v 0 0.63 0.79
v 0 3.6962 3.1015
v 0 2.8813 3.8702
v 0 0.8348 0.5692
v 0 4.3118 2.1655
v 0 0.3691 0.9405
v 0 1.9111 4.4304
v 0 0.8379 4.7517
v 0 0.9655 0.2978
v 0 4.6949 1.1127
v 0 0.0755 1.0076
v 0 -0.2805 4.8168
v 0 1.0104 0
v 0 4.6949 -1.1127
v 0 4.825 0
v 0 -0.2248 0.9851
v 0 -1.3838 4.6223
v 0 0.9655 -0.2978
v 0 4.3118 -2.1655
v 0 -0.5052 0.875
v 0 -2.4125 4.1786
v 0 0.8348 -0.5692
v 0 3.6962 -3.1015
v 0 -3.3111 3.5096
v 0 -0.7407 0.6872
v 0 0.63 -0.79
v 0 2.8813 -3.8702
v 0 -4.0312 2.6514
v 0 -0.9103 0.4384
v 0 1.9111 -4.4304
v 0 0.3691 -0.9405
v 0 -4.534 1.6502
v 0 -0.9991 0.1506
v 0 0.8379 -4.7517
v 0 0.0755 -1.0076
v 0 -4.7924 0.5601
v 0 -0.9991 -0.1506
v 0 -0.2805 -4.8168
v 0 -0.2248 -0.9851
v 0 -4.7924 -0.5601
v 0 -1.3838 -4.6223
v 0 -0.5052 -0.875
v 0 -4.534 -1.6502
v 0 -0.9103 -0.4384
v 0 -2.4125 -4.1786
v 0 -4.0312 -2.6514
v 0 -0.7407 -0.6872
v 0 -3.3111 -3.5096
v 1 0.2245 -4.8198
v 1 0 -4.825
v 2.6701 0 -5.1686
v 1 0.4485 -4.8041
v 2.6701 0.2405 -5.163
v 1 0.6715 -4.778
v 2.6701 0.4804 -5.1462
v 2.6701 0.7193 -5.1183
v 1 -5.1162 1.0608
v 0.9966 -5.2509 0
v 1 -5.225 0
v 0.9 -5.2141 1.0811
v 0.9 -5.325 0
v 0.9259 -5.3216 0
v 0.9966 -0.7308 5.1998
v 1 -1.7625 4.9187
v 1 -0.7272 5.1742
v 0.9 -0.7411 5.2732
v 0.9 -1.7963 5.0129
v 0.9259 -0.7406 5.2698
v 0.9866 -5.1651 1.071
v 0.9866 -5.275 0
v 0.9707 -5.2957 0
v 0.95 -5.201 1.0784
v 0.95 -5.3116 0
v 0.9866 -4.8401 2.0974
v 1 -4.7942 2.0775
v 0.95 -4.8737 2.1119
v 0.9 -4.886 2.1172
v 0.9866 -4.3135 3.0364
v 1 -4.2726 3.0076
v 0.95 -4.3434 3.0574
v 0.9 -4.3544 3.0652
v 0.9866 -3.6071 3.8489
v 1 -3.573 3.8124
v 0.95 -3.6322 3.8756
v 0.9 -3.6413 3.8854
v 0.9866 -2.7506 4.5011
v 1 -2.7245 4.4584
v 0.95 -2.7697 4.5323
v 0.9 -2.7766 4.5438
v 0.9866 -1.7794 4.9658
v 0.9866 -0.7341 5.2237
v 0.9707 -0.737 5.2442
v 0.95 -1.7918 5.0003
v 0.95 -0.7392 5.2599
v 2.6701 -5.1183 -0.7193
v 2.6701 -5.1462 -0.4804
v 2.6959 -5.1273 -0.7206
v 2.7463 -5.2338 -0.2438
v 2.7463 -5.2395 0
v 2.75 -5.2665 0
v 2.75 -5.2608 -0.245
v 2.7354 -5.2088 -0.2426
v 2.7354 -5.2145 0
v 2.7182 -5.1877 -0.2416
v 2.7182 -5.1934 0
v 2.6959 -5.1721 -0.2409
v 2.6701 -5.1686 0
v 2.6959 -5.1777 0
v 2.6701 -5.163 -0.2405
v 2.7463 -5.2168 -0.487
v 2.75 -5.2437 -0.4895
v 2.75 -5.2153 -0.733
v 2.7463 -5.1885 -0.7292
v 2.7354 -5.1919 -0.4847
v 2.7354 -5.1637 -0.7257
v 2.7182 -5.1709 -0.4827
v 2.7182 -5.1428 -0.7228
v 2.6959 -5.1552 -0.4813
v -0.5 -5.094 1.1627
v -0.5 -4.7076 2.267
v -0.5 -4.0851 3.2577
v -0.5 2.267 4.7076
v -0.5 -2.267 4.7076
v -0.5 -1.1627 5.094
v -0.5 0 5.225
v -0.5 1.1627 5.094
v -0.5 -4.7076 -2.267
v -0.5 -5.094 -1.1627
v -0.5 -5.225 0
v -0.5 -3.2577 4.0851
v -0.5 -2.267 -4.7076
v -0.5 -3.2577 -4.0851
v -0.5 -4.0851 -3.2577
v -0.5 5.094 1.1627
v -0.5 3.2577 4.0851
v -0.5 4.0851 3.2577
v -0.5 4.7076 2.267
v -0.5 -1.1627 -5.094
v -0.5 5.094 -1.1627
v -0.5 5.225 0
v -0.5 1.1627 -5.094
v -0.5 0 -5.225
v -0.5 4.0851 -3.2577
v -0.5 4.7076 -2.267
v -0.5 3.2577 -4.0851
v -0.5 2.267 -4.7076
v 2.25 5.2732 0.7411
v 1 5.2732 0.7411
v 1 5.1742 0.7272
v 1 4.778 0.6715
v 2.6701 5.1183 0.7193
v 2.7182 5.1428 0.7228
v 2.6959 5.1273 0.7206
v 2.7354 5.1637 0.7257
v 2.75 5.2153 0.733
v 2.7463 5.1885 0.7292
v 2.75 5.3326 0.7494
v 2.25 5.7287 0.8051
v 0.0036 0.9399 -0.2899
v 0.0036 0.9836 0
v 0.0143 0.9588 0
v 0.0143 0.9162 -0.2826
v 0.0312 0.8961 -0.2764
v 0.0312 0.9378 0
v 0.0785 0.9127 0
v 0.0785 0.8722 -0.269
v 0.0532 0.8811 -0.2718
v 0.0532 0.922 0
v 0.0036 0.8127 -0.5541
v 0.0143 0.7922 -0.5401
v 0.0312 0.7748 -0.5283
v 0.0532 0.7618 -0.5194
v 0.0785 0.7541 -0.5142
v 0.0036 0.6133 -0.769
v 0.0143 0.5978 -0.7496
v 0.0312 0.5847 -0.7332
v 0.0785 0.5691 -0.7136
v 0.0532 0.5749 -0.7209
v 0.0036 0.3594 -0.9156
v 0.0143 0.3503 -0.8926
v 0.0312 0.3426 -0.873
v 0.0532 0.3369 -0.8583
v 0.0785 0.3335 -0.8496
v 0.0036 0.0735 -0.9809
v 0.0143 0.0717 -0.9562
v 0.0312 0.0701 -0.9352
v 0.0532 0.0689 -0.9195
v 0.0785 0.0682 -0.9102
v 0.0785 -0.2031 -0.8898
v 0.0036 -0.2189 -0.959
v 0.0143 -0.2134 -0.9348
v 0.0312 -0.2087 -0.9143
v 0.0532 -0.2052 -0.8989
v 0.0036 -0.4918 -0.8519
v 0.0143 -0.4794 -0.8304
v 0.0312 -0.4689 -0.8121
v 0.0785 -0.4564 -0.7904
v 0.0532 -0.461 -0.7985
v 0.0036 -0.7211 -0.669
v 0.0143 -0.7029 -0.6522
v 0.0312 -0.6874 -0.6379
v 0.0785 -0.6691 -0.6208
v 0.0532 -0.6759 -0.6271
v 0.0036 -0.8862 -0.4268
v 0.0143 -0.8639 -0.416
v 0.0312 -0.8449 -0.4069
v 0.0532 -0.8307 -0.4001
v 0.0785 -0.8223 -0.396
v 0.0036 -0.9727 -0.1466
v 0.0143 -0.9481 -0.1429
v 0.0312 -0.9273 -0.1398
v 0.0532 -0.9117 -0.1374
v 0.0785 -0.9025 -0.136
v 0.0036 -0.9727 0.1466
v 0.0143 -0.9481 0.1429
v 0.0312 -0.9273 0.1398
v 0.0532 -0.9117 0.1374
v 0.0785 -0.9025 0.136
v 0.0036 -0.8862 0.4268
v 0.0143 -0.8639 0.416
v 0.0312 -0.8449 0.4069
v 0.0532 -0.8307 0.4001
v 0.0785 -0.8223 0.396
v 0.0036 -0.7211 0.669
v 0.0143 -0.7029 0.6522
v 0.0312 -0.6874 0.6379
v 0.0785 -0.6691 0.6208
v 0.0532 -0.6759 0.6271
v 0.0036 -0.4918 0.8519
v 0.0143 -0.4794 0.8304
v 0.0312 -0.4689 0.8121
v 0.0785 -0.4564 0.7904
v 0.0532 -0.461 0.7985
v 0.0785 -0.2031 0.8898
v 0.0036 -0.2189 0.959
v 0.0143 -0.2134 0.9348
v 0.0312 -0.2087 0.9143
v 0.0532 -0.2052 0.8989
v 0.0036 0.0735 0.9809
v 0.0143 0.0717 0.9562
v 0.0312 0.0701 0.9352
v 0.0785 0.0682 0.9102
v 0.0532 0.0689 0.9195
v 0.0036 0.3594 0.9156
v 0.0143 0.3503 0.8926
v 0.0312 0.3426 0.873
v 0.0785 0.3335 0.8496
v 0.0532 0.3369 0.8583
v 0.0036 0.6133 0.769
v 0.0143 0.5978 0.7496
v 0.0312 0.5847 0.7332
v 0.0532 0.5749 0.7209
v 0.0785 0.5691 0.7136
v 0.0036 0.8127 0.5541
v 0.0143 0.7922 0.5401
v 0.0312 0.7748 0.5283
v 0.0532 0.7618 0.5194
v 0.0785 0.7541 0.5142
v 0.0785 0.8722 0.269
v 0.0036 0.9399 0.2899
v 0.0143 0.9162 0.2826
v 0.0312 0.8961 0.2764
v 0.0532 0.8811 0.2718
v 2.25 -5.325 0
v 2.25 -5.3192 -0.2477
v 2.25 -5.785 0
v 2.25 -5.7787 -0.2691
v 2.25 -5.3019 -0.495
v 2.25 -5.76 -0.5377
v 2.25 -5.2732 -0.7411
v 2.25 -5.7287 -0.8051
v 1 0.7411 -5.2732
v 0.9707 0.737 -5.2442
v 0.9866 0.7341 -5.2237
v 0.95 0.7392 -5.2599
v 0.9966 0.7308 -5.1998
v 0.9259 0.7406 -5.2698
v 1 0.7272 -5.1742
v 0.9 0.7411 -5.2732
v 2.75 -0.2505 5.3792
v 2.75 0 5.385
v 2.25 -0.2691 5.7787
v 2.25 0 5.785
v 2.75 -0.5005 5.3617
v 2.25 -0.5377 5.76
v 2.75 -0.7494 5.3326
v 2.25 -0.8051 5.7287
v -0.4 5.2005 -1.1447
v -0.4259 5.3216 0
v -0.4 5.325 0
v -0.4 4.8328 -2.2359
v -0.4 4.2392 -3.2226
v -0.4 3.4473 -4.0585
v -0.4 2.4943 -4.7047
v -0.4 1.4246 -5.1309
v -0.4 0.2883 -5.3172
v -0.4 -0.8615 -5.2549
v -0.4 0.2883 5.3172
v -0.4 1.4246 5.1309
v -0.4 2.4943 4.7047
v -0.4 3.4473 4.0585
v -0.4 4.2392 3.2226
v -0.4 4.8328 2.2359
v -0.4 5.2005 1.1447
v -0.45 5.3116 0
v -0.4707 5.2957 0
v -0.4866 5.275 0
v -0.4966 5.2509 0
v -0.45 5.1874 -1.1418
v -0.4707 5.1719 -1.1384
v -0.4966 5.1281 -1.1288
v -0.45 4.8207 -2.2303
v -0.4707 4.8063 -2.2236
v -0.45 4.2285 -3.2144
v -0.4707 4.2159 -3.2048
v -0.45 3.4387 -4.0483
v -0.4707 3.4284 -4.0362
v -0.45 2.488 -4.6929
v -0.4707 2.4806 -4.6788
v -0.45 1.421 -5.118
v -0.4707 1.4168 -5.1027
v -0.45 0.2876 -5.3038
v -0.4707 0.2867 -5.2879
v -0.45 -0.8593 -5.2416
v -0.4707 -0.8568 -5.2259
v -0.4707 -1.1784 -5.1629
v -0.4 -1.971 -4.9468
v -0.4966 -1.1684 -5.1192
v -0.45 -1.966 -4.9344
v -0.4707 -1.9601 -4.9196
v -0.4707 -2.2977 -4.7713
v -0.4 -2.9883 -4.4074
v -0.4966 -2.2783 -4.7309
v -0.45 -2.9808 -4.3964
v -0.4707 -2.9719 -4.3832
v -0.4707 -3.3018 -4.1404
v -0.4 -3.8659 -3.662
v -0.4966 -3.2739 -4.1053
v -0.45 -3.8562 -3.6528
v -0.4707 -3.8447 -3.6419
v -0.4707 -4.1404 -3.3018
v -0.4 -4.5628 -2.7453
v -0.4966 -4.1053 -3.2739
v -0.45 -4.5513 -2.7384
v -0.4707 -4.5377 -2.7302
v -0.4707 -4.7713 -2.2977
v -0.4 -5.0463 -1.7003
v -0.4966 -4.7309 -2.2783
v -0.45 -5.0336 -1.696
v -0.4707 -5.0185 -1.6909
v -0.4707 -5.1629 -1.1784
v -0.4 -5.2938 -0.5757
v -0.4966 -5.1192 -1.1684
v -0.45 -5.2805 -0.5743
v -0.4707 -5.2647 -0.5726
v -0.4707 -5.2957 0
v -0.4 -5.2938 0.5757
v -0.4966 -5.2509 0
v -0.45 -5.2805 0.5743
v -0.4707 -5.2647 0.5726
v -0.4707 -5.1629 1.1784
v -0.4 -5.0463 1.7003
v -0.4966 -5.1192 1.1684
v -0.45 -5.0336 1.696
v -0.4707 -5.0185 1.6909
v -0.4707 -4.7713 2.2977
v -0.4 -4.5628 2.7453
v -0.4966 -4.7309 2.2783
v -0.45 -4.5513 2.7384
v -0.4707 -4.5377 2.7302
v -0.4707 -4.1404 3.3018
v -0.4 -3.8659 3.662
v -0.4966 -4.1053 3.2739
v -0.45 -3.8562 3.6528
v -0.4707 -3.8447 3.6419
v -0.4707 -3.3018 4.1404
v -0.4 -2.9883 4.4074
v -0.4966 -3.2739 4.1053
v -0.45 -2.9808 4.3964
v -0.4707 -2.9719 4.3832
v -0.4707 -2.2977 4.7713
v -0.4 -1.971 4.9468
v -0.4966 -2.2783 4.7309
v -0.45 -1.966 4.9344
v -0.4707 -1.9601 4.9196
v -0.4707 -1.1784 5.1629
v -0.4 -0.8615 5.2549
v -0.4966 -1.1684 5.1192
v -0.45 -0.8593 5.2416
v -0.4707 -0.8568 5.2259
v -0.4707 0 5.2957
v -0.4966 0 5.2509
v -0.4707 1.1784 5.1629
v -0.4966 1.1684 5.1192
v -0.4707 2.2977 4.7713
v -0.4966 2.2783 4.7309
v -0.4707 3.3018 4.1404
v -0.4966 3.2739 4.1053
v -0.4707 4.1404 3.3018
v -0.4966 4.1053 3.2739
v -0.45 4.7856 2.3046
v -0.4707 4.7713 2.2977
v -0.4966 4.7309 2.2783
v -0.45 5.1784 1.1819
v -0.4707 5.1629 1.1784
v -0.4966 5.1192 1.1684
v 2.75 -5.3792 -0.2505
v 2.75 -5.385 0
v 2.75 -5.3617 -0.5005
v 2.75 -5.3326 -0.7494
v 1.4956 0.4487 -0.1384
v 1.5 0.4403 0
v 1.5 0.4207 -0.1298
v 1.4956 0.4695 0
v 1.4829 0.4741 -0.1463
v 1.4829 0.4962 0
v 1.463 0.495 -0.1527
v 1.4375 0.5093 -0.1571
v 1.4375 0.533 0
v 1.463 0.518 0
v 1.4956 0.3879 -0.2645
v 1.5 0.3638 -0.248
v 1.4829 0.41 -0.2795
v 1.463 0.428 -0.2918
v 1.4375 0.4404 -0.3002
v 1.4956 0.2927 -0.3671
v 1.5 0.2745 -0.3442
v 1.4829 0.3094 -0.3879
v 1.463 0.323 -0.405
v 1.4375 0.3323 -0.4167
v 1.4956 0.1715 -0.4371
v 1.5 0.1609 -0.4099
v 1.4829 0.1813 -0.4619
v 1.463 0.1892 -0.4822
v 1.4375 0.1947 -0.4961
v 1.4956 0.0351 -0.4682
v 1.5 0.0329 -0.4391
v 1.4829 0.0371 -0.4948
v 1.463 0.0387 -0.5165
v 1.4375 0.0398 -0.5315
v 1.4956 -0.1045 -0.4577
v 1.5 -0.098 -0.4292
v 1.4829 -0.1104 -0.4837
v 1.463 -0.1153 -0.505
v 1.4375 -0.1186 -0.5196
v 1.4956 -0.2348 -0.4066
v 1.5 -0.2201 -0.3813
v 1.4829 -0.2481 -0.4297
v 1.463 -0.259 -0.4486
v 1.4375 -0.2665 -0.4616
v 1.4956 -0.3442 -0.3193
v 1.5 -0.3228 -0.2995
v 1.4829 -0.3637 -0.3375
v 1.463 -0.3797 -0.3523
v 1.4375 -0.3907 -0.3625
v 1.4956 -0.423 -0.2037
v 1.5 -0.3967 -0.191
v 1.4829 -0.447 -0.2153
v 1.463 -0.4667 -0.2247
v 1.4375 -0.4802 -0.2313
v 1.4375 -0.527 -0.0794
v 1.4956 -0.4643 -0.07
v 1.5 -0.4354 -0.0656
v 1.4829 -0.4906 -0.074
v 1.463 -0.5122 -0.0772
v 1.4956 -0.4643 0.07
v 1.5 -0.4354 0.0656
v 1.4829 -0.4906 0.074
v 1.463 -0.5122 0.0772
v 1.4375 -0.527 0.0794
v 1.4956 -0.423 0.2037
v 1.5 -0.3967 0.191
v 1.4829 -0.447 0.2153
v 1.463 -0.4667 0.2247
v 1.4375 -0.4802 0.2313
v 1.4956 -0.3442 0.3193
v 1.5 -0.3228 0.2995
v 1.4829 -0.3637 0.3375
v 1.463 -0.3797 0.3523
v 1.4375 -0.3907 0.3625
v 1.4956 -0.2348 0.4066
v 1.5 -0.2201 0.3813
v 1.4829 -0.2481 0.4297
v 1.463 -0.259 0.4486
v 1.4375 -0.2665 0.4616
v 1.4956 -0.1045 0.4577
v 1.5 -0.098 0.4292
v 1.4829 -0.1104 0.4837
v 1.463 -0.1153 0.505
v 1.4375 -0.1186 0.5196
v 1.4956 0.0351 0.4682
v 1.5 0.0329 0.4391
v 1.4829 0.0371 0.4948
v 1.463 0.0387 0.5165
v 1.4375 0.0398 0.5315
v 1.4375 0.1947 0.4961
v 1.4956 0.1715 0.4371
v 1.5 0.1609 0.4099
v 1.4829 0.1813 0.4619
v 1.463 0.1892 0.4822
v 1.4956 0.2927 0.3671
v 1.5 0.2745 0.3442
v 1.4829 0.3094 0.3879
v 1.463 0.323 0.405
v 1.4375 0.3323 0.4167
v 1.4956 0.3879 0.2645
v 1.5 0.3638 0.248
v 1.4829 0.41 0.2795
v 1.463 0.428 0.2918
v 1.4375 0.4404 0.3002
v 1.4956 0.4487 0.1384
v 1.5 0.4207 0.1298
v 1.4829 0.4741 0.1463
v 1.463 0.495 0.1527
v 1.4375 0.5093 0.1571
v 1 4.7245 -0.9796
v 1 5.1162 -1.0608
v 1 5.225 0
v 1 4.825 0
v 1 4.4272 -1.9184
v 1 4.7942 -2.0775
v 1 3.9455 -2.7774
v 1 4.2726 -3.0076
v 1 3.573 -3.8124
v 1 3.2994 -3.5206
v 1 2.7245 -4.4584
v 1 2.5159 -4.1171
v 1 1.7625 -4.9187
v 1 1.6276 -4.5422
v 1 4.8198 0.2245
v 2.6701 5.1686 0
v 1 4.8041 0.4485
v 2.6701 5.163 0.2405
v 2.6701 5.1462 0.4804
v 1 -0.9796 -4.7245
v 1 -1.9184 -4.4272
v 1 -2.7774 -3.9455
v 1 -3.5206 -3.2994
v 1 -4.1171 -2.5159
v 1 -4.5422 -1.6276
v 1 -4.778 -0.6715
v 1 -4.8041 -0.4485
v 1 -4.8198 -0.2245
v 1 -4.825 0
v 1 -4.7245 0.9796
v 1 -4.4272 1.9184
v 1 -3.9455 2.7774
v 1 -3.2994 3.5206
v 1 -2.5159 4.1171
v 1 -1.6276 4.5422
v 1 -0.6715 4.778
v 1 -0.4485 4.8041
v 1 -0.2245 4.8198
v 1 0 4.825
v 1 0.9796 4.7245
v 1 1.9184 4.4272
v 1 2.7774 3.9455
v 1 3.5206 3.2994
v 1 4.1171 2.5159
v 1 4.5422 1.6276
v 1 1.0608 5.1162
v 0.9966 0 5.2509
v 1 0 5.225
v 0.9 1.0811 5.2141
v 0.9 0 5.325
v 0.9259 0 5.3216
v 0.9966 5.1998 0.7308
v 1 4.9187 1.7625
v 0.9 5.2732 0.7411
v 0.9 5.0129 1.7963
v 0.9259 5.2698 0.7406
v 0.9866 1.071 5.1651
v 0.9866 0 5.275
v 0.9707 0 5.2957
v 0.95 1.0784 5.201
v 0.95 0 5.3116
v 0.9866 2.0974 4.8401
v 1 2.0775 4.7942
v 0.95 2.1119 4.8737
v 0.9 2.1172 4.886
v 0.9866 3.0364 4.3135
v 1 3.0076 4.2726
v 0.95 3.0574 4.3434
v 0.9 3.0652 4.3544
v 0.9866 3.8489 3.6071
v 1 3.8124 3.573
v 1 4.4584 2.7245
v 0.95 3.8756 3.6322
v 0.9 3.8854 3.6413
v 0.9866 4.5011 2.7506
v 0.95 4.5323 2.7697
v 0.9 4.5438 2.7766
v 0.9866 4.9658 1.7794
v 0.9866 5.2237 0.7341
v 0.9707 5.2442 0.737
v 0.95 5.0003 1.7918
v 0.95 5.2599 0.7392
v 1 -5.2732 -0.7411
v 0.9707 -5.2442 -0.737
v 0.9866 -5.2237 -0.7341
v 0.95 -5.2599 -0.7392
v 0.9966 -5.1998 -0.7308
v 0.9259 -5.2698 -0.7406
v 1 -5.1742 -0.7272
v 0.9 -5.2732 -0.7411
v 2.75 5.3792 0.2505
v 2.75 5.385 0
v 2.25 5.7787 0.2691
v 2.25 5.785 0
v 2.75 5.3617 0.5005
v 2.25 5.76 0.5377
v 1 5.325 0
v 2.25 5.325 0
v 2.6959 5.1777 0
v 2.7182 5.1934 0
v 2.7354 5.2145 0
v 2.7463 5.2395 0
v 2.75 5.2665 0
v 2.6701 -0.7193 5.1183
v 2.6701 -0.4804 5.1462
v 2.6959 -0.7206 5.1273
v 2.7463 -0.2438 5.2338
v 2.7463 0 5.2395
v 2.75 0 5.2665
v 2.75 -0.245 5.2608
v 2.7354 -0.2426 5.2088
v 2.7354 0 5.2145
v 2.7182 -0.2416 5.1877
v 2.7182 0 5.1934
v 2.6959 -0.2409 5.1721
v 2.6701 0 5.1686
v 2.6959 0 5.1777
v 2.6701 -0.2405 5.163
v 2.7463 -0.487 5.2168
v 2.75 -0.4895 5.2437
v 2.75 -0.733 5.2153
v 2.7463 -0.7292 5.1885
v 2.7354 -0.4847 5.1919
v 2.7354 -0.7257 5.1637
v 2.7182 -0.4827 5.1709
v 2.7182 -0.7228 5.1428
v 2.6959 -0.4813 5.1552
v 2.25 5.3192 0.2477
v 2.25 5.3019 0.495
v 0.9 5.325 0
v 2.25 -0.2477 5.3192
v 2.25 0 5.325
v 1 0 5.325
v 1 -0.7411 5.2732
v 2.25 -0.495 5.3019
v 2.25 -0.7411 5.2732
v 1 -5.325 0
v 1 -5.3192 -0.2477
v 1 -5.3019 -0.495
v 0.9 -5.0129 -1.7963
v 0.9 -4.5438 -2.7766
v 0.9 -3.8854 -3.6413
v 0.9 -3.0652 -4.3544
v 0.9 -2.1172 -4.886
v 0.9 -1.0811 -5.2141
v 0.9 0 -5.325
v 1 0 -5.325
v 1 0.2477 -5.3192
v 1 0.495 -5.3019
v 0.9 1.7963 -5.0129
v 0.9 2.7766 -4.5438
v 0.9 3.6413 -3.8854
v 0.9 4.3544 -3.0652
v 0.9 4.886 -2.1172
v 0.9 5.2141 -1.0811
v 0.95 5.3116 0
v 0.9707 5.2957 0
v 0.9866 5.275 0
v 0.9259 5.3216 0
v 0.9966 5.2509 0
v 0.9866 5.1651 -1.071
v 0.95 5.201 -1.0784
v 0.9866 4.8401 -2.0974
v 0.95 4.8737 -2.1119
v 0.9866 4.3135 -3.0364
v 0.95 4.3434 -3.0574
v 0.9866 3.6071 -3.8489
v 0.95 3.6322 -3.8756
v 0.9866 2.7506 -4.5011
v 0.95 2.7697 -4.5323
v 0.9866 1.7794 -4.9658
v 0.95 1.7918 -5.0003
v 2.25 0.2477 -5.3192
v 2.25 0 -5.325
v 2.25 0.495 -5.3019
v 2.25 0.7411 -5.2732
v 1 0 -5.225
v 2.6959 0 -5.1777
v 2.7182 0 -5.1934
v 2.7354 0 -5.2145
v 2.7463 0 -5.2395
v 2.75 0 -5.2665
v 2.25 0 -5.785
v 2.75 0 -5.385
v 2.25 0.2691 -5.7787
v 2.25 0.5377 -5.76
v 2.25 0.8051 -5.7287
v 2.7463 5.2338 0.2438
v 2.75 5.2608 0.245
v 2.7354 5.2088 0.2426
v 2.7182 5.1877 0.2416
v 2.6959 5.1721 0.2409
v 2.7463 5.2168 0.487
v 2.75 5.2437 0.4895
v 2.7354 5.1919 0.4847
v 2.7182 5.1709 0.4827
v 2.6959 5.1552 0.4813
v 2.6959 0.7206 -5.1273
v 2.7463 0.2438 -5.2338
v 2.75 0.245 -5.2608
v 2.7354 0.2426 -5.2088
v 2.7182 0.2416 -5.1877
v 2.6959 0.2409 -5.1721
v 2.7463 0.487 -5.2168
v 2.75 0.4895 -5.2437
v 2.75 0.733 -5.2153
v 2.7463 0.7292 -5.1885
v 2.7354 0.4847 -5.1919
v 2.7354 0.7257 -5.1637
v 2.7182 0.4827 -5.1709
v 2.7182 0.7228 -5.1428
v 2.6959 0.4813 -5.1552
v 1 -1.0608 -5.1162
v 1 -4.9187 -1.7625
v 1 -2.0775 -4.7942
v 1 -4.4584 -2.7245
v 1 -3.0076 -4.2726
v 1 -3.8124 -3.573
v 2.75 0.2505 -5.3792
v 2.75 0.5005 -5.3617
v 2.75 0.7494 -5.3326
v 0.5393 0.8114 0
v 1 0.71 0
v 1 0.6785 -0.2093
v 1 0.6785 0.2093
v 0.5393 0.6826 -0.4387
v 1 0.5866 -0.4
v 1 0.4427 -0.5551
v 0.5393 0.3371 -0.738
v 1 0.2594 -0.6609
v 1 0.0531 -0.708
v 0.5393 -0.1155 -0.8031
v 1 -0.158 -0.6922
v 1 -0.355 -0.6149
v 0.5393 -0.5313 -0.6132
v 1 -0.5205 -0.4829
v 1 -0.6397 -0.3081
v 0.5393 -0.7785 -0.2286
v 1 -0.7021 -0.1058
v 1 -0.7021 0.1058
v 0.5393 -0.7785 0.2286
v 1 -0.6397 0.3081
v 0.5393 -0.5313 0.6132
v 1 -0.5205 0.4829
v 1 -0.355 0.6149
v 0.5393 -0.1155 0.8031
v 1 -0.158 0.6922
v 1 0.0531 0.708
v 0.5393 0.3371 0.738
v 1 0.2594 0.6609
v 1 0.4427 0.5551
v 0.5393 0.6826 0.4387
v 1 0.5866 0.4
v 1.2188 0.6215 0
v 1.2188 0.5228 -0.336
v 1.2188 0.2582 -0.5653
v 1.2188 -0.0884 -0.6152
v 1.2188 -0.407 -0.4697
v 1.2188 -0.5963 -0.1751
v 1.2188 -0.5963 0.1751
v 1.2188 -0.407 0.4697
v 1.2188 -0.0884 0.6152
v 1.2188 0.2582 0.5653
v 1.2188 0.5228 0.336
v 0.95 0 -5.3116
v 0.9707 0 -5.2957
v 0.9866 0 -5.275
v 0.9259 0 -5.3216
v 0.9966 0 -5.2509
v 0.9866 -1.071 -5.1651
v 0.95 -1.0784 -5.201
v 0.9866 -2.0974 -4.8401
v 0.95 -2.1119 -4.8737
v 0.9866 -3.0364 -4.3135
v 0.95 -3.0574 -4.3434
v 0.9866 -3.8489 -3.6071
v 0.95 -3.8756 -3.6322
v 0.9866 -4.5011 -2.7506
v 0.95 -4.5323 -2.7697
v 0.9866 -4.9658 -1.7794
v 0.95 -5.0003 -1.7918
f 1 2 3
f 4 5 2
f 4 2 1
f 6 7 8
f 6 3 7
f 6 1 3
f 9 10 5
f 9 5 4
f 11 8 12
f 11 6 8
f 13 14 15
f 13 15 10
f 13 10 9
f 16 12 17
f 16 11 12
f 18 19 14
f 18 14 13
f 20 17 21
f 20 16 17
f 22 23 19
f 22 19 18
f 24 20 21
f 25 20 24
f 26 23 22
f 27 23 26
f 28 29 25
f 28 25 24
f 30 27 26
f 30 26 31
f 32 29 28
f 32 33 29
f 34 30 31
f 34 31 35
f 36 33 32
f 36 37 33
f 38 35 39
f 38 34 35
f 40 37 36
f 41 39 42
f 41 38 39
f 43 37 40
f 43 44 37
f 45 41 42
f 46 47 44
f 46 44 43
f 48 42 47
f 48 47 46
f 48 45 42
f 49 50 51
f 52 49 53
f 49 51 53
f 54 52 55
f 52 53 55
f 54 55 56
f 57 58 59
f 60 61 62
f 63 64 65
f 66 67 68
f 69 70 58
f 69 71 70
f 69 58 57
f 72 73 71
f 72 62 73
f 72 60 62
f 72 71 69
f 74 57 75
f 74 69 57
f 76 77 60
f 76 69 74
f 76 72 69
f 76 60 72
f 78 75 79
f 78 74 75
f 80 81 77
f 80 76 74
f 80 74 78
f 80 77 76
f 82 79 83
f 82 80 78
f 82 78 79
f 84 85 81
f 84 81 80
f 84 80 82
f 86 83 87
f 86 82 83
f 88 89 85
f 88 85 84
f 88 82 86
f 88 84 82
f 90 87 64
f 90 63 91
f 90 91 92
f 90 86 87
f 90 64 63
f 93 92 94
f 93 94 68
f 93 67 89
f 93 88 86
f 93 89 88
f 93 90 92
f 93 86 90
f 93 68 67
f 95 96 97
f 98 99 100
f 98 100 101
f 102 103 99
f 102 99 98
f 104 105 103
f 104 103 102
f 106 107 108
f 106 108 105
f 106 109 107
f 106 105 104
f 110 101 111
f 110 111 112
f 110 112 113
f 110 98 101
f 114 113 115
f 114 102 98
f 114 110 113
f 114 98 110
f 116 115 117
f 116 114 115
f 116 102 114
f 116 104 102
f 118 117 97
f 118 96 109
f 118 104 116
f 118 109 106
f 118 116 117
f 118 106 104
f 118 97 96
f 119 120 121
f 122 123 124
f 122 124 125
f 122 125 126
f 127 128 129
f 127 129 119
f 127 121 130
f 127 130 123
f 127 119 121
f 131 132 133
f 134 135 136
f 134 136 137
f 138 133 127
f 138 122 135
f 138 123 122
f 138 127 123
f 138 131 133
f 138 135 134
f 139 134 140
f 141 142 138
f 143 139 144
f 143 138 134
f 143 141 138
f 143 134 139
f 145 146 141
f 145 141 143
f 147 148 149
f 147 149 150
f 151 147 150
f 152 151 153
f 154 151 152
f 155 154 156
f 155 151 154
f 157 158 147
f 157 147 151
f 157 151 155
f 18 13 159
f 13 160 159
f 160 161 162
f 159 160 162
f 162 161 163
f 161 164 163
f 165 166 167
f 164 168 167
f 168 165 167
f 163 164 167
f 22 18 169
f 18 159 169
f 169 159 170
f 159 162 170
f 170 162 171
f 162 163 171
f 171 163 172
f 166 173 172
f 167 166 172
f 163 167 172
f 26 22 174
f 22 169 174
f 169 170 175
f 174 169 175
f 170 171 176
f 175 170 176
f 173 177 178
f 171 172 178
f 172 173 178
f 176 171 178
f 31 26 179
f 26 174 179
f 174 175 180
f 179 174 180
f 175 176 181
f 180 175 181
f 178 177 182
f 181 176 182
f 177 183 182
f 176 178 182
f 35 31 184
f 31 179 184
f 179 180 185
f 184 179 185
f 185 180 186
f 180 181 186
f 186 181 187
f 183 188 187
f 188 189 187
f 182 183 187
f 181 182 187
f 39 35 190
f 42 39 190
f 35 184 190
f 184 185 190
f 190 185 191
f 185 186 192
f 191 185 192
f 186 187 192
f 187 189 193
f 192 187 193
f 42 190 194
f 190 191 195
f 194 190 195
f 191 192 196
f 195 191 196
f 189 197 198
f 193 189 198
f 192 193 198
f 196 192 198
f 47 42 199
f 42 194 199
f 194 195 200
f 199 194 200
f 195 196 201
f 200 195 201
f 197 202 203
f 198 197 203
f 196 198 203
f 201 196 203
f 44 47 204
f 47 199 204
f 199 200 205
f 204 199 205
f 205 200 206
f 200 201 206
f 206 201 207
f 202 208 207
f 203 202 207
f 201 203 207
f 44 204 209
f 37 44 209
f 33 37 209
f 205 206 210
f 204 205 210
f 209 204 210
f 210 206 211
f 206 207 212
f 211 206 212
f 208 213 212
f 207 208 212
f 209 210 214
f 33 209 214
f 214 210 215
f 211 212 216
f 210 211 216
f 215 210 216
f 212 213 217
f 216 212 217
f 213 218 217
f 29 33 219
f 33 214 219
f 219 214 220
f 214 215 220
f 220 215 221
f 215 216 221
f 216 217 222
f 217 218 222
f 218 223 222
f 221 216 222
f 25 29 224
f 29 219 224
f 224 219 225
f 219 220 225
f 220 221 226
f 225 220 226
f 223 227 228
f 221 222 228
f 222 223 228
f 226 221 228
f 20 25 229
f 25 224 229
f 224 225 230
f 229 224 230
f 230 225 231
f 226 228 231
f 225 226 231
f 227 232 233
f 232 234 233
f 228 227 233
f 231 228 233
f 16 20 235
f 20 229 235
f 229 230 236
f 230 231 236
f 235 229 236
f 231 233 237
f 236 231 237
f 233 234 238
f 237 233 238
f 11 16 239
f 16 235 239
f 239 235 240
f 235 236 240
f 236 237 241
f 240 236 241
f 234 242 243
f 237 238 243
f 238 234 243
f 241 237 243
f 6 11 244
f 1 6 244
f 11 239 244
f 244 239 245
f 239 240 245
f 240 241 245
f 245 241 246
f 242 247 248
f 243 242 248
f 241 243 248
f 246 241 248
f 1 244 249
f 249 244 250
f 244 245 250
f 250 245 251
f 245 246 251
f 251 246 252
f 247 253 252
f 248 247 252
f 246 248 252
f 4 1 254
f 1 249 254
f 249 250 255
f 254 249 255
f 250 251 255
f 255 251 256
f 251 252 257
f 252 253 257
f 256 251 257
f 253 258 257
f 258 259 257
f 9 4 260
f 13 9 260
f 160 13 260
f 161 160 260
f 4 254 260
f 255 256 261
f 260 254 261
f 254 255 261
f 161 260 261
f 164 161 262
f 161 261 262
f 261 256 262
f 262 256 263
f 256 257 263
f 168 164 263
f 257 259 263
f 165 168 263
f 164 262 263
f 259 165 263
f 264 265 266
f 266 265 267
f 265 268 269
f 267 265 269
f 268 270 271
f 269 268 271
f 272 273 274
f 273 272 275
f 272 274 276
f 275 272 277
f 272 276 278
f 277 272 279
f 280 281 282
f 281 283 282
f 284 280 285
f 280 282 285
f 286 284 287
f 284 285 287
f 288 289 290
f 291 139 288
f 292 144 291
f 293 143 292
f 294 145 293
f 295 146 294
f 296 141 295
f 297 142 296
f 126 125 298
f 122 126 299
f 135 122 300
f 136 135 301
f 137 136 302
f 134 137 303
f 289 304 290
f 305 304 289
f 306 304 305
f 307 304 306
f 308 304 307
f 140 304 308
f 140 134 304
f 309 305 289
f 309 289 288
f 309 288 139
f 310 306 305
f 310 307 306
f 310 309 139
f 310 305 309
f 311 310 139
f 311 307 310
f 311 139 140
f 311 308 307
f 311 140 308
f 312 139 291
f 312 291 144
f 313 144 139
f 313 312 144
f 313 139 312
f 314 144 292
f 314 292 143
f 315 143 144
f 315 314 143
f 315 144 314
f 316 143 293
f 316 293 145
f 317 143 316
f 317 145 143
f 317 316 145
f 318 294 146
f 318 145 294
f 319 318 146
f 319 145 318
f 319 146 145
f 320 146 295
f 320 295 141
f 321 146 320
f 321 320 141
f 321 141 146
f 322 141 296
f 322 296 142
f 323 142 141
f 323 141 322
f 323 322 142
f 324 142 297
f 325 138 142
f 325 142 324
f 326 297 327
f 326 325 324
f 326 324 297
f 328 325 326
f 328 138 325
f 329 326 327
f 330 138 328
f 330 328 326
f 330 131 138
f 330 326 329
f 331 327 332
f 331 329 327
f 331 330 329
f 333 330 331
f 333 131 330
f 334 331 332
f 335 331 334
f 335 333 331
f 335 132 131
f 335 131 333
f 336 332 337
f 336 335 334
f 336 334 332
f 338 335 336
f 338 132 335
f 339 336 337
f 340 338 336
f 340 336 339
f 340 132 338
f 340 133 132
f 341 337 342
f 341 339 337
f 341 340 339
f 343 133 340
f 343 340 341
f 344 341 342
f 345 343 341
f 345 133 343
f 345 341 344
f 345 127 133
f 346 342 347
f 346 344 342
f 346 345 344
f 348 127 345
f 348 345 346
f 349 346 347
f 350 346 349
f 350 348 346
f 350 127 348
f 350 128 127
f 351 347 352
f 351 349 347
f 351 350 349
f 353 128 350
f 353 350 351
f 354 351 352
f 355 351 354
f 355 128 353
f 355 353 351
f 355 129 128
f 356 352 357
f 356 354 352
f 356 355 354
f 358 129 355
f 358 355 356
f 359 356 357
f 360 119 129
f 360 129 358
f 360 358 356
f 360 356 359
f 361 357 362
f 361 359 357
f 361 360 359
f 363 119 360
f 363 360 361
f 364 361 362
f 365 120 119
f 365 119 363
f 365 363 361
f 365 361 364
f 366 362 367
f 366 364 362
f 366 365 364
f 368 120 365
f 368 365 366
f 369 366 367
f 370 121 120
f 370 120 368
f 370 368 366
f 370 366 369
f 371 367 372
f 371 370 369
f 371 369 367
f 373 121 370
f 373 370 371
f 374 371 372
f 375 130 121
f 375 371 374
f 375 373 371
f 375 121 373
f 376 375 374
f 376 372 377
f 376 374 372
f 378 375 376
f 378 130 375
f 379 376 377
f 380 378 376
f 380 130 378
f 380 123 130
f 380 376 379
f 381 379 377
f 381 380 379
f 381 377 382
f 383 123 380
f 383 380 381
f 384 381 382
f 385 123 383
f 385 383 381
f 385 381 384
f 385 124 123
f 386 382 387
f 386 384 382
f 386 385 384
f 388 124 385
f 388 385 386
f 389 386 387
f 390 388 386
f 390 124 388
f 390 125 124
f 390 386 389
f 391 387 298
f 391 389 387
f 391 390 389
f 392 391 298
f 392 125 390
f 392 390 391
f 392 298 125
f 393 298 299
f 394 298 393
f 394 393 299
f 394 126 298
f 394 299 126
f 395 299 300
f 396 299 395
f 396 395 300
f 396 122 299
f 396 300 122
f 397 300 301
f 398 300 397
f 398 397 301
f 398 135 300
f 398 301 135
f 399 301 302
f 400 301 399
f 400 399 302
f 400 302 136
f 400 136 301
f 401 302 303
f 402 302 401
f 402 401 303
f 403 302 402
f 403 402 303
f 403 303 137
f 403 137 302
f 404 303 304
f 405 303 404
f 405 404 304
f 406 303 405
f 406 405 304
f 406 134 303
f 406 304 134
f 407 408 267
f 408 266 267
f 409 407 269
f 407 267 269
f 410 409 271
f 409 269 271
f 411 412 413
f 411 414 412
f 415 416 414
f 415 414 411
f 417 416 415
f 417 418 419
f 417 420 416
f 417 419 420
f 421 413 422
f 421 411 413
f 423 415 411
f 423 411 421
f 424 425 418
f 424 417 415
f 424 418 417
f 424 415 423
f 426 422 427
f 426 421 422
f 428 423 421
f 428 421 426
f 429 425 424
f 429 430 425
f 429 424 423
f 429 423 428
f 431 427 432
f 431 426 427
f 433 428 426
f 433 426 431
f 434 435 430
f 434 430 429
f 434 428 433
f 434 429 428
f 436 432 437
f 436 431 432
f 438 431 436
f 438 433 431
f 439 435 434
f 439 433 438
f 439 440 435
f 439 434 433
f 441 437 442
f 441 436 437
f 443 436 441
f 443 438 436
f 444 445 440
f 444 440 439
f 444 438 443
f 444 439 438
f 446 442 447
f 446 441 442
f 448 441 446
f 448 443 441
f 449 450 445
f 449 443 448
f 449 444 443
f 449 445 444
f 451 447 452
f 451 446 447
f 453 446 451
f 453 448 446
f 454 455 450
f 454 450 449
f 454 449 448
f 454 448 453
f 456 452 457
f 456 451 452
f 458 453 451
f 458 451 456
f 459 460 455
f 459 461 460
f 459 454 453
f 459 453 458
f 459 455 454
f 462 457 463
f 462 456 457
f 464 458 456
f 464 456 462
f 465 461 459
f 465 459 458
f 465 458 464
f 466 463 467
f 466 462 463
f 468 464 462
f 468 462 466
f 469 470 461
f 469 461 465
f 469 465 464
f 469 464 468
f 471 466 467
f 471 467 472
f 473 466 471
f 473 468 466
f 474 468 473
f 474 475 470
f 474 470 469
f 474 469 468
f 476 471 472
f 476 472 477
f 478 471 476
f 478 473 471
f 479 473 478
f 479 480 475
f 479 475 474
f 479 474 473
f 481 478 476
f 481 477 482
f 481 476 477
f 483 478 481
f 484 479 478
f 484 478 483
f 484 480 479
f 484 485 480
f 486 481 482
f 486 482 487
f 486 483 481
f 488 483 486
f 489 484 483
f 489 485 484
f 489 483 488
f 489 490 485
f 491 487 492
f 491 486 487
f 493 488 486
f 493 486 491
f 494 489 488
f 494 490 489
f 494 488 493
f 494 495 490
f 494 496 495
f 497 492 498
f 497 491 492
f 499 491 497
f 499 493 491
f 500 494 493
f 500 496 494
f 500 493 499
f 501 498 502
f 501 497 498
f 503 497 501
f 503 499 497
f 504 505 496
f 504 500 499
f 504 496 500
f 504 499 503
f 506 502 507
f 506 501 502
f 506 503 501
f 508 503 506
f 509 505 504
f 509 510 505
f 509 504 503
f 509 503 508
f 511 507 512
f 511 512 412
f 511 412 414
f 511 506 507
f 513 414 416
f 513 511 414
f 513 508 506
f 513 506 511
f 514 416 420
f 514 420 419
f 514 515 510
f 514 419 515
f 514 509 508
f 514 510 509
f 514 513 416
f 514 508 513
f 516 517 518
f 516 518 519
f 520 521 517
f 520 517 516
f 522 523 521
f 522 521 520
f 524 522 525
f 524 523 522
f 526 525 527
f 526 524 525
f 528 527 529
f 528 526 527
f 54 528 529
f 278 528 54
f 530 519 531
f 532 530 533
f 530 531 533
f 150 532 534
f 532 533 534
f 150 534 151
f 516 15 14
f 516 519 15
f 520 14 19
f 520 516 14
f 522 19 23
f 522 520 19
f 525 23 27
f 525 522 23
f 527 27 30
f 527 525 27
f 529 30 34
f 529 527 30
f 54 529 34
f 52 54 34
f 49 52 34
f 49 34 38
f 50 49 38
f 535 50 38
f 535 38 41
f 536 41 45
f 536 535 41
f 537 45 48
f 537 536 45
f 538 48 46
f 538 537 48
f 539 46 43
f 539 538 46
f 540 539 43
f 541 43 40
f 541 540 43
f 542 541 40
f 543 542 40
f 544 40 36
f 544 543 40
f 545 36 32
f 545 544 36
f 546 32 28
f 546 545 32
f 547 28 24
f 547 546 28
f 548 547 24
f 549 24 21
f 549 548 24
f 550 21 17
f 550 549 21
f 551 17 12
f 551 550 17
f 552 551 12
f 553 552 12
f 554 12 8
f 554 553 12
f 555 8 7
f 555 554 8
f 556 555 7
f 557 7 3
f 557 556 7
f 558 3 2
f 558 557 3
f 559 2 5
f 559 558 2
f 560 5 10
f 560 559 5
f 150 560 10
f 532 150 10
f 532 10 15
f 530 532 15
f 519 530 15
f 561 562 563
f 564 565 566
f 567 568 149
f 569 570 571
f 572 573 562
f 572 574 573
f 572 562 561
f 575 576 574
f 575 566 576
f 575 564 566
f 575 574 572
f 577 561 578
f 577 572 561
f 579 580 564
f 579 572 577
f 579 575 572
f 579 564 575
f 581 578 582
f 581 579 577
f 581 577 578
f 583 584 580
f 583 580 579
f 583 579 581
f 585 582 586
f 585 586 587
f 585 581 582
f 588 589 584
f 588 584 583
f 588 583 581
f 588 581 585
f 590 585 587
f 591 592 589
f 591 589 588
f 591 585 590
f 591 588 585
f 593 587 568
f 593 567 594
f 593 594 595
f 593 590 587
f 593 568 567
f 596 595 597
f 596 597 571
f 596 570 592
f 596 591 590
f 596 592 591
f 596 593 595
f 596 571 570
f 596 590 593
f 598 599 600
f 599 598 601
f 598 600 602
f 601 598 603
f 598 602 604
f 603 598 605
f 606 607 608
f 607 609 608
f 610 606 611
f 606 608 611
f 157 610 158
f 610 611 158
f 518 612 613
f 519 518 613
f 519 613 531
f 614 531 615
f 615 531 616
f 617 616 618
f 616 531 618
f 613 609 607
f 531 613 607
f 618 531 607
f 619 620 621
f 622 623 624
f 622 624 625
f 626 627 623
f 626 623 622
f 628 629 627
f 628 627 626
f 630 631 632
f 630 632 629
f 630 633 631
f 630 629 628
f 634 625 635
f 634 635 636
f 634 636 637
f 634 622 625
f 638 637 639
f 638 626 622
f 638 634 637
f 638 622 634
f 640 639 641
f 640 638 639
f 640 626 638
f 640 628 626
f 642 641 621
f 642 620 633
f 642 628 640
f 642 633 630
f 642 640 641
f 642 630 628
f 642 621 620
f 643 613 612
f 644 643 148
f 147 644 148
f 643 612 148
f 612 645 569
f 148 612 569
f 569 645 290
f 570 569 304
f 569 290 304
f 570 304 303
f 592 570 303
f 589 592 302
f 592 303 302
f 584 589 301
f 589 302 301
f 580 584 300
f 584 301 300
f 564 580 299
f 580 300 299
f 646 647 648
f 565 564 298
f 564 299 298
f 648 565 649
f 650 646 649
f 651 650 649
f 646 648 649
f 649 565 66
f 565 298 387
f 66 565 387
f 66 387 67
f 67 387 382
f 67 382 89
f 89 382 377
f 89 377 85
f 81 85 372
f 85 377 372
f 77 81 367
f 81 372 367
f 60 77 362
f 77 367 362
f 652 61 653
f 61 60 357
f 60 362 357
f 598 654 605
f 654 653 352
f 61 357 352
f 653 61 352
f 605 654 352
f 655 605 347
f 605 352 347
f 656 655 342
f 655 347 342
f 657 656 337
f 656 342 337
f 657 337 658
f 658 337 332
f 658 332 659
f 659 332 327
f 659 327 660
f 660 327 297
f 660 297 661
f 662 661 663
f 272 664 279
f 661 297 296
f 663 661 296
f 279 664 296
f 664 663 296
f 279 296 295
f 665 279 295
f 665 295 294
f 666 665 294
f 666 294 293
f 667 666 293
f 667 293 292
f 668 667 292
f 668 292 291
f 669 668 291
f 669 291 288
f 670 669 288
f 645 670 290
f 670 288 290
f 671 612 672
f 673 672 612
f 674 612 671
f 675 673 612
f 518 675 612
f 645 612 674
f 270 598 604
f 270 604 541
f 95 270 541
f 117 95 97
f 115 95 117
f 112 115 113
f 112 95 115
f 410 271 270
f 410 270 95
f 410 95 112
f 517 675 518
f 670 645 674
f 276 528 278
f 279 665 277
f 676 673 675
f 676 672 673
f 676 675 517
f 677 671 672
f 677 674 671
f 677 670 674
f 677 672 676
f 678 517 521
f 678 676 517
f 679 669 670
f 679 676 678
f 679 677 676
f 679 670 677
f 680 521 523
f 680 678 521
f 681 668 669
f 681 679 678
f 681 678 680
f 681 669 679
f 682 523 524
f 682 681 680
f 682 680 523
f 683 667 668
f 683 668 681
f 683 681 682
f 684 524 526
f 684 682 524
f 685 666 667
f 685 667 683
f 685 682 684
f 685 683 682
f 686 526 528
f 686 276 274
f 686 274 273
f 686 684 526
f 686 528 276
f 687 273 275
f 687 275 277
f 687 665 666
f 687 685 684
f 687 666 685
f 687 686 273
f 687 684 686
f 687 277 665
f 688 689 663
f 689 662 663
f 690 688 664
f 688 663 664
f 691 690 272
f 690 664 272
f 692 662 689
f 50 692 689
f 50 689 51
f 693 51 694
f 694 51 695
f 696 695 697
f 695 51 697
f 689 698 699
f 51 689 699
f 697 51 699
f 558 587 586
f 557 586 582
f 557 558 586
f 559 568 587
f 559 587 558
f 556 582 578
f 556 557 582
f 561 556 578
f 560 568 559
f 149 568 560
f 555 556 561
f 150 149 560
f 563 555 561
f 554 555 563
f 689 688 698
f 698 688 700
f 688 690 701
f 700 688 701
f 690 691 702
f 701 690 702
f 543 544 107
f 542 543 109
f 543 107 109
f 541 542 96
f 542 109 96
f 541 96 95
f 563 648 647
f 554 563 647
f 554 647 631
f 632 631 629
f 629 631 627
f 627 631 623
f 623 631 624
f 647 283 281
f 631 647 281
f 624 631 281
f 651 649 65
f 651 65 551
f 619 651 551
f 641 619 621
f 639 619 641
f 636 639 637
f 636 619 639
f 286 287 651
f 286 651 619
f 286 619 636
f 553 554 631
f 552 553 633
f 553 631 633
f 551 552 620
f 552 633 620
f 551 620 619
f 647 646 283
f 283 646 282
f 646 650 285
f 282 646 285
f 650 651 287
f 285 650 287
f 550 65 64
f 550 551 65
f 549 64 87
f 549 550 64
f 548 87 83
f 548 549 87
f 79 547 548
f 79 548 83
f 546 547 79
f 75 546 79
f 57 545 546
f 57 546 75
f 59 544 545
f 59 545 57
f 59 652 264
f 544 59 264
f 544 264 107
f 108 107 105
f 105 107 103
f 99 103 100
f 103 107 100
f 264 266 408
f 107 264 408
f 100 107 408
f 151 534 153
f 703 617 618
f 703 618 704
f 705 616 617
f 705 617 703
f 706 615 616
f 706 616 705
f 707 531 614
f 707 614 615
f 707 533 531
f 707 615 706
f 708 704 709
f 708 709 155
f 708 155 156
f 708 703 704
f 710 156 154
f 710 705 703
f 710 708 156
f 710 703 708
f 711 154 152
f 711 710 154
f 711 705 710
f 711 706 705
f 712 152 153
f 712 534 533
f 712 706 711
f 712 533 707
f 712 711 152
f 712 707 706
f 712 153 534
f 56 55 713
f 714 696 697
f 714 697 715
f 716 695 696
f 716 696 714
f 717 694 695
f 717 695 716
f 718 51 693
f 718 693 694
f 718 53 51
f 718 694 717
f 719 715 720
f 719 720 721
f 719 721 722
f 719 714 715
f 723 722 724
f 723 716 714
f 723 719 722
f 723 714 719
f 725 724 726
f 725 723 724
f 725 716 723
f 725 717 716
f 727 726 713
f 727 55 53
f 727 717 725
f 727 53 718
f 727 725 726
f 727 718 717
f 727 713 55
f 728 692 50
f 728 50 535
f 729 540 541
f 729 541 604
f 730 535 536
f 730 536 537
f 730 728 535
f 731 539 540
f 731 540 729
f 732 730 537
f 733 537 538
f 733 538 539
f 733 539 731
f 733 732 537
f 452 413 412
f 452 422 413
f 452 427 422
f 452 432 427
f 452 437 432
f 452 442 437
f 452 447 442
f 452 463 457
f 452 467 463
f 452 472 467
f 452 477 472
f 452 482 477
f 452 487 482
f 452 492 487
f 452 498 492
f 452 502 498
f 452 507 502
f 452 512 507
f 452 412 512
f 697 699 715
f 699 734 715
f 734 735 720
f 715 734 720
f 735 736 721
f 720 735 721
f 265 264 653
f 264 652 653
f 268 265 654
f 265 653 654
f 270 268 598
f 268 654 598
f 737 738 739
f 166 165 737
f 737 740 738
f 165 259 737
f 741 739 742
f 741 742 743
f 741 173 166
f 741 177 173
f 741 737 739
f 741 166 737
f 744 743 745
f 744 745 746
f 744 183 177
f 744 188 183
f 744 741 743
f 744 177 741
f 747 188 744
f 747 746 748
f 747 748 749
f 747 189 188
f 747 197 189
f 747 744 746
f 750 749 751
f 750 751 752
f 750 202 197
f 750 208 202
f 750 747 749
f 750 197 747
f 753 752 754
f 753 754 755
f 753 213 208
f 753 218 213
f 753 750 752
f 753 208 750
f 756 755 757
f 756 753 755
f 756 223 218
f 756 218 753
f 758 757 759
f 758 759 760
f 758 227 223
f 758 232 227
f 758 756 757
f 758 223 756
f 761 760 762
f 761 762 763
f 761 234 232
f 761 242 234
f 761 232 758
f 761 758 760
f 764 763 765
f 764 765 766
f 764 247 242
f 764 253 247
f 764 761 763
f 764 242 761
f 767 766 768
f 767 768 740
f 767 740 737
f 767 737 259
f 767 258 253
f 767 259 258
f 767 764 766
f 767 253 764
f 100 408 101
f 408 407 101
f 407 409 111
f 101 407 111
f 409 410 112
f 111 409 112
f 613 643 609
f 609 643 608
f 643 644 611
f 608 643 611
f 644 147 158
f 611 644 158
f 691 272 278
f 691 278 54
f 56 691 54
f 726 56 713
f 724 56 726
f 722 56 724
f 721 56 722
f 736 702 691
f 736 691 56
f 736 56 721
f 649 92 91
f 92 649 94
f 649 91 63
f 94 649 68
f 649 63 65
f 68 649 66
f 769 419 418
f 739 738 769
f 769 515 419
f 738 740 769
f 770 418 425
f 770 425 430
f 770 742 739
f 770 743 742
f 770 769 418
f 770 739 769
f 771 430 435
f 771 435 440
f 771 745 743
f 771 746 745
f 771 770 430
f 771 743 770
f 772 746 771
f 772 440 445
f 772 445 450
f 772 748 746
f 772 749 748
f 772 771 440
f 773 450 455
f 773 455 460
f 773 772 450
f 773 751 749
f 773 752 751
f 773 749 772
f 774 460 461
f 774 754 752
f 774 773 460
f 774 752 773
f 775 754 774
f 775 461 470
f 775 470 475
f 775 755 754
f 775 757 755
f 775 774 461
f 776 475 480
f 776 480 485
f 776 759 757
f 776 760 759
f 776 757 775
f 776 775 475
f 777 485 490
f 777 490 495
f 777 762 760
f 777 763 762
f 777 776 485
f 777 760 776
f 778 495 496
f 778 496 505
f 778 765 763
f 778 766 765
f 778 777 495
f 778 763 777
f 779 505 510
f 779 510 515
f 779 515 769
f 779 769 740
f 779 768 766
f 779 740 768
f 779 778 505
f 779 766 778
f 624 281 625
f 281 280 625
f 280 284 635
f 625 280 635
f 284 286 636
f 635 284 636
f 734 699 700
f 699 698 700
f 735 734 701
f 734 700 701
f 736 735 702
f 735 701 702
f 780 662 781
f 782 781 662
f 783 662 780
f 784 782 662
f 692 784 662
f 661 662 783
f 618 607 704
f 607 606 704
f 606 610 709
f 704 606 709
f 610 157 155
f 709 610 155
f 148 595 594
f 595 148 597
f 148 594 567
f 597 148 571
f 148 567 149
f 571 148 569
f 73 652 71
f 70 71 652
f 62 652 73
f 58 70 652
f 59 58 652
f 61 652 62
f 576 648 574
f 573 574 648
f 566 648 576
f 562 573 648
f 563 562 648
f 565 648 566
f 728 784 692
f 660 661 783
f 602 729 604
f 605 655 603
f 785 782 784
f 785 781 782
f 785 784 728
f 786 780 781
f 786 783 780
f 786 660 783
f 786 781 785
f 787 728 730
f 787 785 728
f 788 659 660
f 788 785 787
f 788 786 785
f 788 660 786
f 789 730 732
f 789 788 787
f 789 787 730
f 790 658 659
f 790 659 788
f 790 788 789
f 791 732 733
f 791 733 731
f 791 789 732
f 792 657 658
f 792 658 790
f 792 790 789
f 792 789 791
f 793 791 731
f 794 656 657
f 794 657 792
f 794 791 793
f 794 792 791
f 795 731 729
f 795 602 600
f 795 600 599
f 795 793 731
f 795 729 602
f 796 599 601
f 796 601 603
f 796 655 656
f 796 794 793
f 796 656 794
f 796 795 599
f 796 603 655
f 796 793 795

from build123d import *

# Parameters (mm, degrees)
REVOLVE6_ANGLE    = 8
CIRPATTERN2_COUNT = 4
FILLET2_R         = 0.1


with BuildPart() as part:
    # Sketch1 → Revolve2 (revolve)
    with BuildSketch(Plane.XY):
        Polygon((1, 5.325), (0, 5.325), (-0.5, 5.325), (-0.5, 4.885), (-0.5, 1.49), (-0.5, 0), (0.25, 0), (1, 0), (1.5, 0), (1.5, 0.507702176), (1, 0.71), (0, 0.93), (0, 4.825), (1, 4.825), align=None)
    revolve(axis=Axis((1, 0, 0), (-1, 0, 0)))

    # Sketch4 → Revolve6 (revolve)
    with BuildSketch(Plane.XY):
        Polygon((2.75, 5.185), (2.75, 5.385), (2.25, 5.785), (2.25, 5.325), (1, 5.325), (1, 5.185), (1, 4.825), align=None)
    revolve6 = revolve(axis=Axis((0, 0, 0), (1, 0, 0)), revolution_arc=REVOLVE6_ANGLE)

    # CirPattern2: Revolve6 ×4 about axis
    cirpattern2_axis = Axis((0, 0, 0), (-1, 0, 0))
    for i in range(1, CIRPATTERN2_COUNT):
        add(revolve6.rotate(cirpattern2_axis, i * 360 / CIRPATTERN2_COUNT))

    # Fillet2
    # the kernel refuses this fillet: 0.1 mm, written as the material it adds along each edge
    with BuildSketch(Plane(origin=(0, 0, 0), x_dir=(0, 1, 0), z_dir=(0, 0, 1))) as fillet2_piece_1:
        with BuildLine():
            CenterArc((0.93 + FILLET2_R * 0.803914058894, -FILLET2_R), FILLET2_R, 90, 77.592581473)
            Line((0.93 - FILLET2_R * 0.172730407811, -FILLET2_R * 0.785138217325), (0.93, 0))
            Line((0.93, 0), (0.93 + FILLET2_R * 0.803914058894, 0))
        make_face()
    revolve(axis=Axis((0, 0, 0), (-1, 0, 0)))
    # the kernel refuses this fillet: 0.1 mm, written as the material it takes off along each edge
    with BuildSketch(Plane(origin=(1.5, 0, 0), x_dir=(0, 1, 0), z_dir=(0, 0, 1))) as fillet2_2_piece_1:
        with BuildLine():
            CenterArc((0.507702176 - FILLET2_R * 0.674152532906, FILLET2_R), FILLET2_R, 270, 67.971958378)
            Line((0.507702176 - FILLET2_R * 0.674152532906, 0), (0.507702176, 0))
            Line((0.507702176, 0), (0.507702176 + FILLET2_R * 0.252847871179, FILLET2_R * 0.62493967042))
        make_face()
    revolve(axis=Axis((1.5, 0, 0), (-1, 0, 0)), mode=Mode.SUBTRACT)
    with BuildSketch(Plane(origin=(1, 0, 0), x_dir=(0, 1, 0), z_dir=(0, 0, 1))) as fillet2_2_piece_2:
        with BuildLine():
            CenterArc((5.325 - FILLET2_R, FILLET2_R), FILLET2_R, 270, 90)
            Line((5.325, FILLET2_R), (5.325, 0))
            Line((5.325, 0), (5.325 - FILLET2_R, 0))
        make_face()
    revolve(axis=Axis((1, 0, 0), (-1, 0, 0)), revolution_arc=82, mode=Mode.SUBTRACT)
    with BuildSketch(Plane(origin=(2.75, 0, 0), x_dir=(0, -0.03929693023506649, -0.9992275773186509), z_dir=(0, -0.9992275773186509, 0.03929693023506649))) as fillet2_2_piece_3:
        with BuildLine():
            CenterArc((5.185 + FILLET2_R * 0.815225657351, -FILLET2_R), FILLET2_R, 90, 78.375604276)
            Line((5.185 + FILLET2_R * 0.815225657351, 0), (5.185, 0))
            Line((5.185, 0), (5.185 - FILLET2_R * 0.164263887349, -FILLET2_R * 0.798505007947))
        make_face()
    revolve(axis=Axis((2.75, 0, 0), (1, 0, 0)), revolution_arc=12.50425629, mode=Mode.SUBTRACT)
    with BuildSketch(Plane(origin=(1, 0, 0), x_dir=(0, 0, -1), z_dir=(0, 1, 0))) as fillet2_2_piece_4:
        with BuildLine():
            CenterArc((5.325 - FILLET2_R, FILLET2_R), FILLET2_R, 270, 90)
            Line((5.325, FILLET2_R), (5.325, 0))
            Line((5.325, 0), (5.325 - FILLET2_R, 0))
        make_face()
    revolve(axis=Axis((1, 0, 0), (-1, 0, 0)), revolution_arc=82, mode=Mode.SUBTRACT)
    with BuildSketch(Plane(origin=(2.75, 0, 0), x_dir=(0, -0.9992275773186509, 0.039296930235066474), z_dir=(0, 0.039296930235066474, 0.9992275773186509))) as fillet2_2_piece_5:
        with BuildLine():
            CenterArc((5.185 + FILLET2_R * 0.815225657351, -FILLET2_R), FILLET2_R, 90, 78.375604276)
            Line((5.185 + FILLET2_R * 0.815225657351, 0), (5.185, 0))
            Line((5.185, 0), (5.185 - FILLET2_R * 0.164263887349, -FILLET2_R * 0.798505007947))
        make_face()
    revolve(axis=Axis((2.75, 0, 0), (1, 0, 0)), revolution_arc=12.50425629, mode=Mode.SUBTRACT)
    with BuildSketch(Plane(origin=(1, 0, 0), x_dir=(0, -1, 0), z_dir=(0, 0, -1))) as fillet2_2_piece_6:
        with BuildLine():
            CenterArc((5.325 - FILLET2_R, FILLET2_R), FILLET2_R, 270, 90)
            Line((5.325, FILLET2_R), (5.325, 0))
            Line((5.325, 0), (5.325 - FILLET2_R, 0))
        make_face()
    revolve(axis=Axis((1, 0, 0), (-1, 0, 0)), revolution_arc=82, mode=Mode.SUBTRACT)
    with BuildSketch(Plane(origin=(2.75, 0, 0), x_dir=(0, 0.039296930235066384, 0.9992275773186509), z_dir=(0, 0.9992275773186509, -0.039296930235066384))) as fillet2_2_piece_7:
        with BuildLine():
            CenterArc((5.185 + FILLET2_R * 0.815225657351, -FILLET2_R), FILLET2_R, 90, 78.375604276)
            Line((5.185 + FILLET2_R * 0.815225657351, 0), (5.185, 0))
            Line((5.185, 0), (5.185 - FILLET2_R * 0.164263887349, -FILLET2_R * 0.798505007947))
        make_face()
    revolve(axis=Axis((2.75, 0, 0), (1, 0, 0)), revolution_arc=12.50425629, mode=Mode.SUBTRACT)
    with BuildSketch(Plane(origin=(1, 0, 0), x_dir=(0, 0, 1), z_dir=(0, -1, 0))) as fillet2_2_piece_8:
        with BuildLine():
            CenterArc((5.325 - FILLET2_R, FILLET2_R), FILLET2_R, 270, 90)
            Line((5.325, FILLET2_R), (5.325, 0))
            Line((5.325, 0), (5.325 - FILLET2_R, 0))
        make_face()
    revolve(axis=Axis((1, 0, 0), (-1, 0, 0)), revolution_arc=82, mode=Mode.SUBTRACT)
    with BuildSketch(Plane(origin=(2.75, 0, 0), x_dir=(0, 0.9992275773186509, -0.0392969302350666), z_dir=(0, -0.0392969302350666, -0.9992275773186509))) as fillet2_2_piece_9:
        with BuildLine():
            CenterArc((5.185 + FILLET2_R * 0.815225657351, -FILLET2_R), FILLET2_R, 90, 78.375604276)
            Line((5.185 + FILLET2_R * 0.815225657351, 0), (5.185, 0))
            Line((5.185, 0), (5.185 - FILLET2_R * 0.164263887349, -FILLET2_R * 0.798505007947))
        make_face()
    revolve(axis=Axis((2.75, 0, 0), (1, 0, 0)), revolution_arc=12.50425629, mode=Mode.SUBTRACT)
    with BuildSketch(Plane(origin=(-0.5, 0, 0), x_dir=(0, 1, 0), z_dir=(0, 0, 1))) as fillet2_2_piece_10:
        with BuildLine():
            CenterArc((5.325 - FILLET2_R, -FILLET2_R), FILLET2_R, 0, 90)
            Line((5.325 - FILLET2_R, 0), (5.325, 0))
            Line((5.325, 0), (5.325, -FILLET2_R))
        make_face()
    revolve(axis=Axis((-0.5, 0, 0), (-1, 0, 0)), mode=Mode.SUBTRACT)


solid = part.part
